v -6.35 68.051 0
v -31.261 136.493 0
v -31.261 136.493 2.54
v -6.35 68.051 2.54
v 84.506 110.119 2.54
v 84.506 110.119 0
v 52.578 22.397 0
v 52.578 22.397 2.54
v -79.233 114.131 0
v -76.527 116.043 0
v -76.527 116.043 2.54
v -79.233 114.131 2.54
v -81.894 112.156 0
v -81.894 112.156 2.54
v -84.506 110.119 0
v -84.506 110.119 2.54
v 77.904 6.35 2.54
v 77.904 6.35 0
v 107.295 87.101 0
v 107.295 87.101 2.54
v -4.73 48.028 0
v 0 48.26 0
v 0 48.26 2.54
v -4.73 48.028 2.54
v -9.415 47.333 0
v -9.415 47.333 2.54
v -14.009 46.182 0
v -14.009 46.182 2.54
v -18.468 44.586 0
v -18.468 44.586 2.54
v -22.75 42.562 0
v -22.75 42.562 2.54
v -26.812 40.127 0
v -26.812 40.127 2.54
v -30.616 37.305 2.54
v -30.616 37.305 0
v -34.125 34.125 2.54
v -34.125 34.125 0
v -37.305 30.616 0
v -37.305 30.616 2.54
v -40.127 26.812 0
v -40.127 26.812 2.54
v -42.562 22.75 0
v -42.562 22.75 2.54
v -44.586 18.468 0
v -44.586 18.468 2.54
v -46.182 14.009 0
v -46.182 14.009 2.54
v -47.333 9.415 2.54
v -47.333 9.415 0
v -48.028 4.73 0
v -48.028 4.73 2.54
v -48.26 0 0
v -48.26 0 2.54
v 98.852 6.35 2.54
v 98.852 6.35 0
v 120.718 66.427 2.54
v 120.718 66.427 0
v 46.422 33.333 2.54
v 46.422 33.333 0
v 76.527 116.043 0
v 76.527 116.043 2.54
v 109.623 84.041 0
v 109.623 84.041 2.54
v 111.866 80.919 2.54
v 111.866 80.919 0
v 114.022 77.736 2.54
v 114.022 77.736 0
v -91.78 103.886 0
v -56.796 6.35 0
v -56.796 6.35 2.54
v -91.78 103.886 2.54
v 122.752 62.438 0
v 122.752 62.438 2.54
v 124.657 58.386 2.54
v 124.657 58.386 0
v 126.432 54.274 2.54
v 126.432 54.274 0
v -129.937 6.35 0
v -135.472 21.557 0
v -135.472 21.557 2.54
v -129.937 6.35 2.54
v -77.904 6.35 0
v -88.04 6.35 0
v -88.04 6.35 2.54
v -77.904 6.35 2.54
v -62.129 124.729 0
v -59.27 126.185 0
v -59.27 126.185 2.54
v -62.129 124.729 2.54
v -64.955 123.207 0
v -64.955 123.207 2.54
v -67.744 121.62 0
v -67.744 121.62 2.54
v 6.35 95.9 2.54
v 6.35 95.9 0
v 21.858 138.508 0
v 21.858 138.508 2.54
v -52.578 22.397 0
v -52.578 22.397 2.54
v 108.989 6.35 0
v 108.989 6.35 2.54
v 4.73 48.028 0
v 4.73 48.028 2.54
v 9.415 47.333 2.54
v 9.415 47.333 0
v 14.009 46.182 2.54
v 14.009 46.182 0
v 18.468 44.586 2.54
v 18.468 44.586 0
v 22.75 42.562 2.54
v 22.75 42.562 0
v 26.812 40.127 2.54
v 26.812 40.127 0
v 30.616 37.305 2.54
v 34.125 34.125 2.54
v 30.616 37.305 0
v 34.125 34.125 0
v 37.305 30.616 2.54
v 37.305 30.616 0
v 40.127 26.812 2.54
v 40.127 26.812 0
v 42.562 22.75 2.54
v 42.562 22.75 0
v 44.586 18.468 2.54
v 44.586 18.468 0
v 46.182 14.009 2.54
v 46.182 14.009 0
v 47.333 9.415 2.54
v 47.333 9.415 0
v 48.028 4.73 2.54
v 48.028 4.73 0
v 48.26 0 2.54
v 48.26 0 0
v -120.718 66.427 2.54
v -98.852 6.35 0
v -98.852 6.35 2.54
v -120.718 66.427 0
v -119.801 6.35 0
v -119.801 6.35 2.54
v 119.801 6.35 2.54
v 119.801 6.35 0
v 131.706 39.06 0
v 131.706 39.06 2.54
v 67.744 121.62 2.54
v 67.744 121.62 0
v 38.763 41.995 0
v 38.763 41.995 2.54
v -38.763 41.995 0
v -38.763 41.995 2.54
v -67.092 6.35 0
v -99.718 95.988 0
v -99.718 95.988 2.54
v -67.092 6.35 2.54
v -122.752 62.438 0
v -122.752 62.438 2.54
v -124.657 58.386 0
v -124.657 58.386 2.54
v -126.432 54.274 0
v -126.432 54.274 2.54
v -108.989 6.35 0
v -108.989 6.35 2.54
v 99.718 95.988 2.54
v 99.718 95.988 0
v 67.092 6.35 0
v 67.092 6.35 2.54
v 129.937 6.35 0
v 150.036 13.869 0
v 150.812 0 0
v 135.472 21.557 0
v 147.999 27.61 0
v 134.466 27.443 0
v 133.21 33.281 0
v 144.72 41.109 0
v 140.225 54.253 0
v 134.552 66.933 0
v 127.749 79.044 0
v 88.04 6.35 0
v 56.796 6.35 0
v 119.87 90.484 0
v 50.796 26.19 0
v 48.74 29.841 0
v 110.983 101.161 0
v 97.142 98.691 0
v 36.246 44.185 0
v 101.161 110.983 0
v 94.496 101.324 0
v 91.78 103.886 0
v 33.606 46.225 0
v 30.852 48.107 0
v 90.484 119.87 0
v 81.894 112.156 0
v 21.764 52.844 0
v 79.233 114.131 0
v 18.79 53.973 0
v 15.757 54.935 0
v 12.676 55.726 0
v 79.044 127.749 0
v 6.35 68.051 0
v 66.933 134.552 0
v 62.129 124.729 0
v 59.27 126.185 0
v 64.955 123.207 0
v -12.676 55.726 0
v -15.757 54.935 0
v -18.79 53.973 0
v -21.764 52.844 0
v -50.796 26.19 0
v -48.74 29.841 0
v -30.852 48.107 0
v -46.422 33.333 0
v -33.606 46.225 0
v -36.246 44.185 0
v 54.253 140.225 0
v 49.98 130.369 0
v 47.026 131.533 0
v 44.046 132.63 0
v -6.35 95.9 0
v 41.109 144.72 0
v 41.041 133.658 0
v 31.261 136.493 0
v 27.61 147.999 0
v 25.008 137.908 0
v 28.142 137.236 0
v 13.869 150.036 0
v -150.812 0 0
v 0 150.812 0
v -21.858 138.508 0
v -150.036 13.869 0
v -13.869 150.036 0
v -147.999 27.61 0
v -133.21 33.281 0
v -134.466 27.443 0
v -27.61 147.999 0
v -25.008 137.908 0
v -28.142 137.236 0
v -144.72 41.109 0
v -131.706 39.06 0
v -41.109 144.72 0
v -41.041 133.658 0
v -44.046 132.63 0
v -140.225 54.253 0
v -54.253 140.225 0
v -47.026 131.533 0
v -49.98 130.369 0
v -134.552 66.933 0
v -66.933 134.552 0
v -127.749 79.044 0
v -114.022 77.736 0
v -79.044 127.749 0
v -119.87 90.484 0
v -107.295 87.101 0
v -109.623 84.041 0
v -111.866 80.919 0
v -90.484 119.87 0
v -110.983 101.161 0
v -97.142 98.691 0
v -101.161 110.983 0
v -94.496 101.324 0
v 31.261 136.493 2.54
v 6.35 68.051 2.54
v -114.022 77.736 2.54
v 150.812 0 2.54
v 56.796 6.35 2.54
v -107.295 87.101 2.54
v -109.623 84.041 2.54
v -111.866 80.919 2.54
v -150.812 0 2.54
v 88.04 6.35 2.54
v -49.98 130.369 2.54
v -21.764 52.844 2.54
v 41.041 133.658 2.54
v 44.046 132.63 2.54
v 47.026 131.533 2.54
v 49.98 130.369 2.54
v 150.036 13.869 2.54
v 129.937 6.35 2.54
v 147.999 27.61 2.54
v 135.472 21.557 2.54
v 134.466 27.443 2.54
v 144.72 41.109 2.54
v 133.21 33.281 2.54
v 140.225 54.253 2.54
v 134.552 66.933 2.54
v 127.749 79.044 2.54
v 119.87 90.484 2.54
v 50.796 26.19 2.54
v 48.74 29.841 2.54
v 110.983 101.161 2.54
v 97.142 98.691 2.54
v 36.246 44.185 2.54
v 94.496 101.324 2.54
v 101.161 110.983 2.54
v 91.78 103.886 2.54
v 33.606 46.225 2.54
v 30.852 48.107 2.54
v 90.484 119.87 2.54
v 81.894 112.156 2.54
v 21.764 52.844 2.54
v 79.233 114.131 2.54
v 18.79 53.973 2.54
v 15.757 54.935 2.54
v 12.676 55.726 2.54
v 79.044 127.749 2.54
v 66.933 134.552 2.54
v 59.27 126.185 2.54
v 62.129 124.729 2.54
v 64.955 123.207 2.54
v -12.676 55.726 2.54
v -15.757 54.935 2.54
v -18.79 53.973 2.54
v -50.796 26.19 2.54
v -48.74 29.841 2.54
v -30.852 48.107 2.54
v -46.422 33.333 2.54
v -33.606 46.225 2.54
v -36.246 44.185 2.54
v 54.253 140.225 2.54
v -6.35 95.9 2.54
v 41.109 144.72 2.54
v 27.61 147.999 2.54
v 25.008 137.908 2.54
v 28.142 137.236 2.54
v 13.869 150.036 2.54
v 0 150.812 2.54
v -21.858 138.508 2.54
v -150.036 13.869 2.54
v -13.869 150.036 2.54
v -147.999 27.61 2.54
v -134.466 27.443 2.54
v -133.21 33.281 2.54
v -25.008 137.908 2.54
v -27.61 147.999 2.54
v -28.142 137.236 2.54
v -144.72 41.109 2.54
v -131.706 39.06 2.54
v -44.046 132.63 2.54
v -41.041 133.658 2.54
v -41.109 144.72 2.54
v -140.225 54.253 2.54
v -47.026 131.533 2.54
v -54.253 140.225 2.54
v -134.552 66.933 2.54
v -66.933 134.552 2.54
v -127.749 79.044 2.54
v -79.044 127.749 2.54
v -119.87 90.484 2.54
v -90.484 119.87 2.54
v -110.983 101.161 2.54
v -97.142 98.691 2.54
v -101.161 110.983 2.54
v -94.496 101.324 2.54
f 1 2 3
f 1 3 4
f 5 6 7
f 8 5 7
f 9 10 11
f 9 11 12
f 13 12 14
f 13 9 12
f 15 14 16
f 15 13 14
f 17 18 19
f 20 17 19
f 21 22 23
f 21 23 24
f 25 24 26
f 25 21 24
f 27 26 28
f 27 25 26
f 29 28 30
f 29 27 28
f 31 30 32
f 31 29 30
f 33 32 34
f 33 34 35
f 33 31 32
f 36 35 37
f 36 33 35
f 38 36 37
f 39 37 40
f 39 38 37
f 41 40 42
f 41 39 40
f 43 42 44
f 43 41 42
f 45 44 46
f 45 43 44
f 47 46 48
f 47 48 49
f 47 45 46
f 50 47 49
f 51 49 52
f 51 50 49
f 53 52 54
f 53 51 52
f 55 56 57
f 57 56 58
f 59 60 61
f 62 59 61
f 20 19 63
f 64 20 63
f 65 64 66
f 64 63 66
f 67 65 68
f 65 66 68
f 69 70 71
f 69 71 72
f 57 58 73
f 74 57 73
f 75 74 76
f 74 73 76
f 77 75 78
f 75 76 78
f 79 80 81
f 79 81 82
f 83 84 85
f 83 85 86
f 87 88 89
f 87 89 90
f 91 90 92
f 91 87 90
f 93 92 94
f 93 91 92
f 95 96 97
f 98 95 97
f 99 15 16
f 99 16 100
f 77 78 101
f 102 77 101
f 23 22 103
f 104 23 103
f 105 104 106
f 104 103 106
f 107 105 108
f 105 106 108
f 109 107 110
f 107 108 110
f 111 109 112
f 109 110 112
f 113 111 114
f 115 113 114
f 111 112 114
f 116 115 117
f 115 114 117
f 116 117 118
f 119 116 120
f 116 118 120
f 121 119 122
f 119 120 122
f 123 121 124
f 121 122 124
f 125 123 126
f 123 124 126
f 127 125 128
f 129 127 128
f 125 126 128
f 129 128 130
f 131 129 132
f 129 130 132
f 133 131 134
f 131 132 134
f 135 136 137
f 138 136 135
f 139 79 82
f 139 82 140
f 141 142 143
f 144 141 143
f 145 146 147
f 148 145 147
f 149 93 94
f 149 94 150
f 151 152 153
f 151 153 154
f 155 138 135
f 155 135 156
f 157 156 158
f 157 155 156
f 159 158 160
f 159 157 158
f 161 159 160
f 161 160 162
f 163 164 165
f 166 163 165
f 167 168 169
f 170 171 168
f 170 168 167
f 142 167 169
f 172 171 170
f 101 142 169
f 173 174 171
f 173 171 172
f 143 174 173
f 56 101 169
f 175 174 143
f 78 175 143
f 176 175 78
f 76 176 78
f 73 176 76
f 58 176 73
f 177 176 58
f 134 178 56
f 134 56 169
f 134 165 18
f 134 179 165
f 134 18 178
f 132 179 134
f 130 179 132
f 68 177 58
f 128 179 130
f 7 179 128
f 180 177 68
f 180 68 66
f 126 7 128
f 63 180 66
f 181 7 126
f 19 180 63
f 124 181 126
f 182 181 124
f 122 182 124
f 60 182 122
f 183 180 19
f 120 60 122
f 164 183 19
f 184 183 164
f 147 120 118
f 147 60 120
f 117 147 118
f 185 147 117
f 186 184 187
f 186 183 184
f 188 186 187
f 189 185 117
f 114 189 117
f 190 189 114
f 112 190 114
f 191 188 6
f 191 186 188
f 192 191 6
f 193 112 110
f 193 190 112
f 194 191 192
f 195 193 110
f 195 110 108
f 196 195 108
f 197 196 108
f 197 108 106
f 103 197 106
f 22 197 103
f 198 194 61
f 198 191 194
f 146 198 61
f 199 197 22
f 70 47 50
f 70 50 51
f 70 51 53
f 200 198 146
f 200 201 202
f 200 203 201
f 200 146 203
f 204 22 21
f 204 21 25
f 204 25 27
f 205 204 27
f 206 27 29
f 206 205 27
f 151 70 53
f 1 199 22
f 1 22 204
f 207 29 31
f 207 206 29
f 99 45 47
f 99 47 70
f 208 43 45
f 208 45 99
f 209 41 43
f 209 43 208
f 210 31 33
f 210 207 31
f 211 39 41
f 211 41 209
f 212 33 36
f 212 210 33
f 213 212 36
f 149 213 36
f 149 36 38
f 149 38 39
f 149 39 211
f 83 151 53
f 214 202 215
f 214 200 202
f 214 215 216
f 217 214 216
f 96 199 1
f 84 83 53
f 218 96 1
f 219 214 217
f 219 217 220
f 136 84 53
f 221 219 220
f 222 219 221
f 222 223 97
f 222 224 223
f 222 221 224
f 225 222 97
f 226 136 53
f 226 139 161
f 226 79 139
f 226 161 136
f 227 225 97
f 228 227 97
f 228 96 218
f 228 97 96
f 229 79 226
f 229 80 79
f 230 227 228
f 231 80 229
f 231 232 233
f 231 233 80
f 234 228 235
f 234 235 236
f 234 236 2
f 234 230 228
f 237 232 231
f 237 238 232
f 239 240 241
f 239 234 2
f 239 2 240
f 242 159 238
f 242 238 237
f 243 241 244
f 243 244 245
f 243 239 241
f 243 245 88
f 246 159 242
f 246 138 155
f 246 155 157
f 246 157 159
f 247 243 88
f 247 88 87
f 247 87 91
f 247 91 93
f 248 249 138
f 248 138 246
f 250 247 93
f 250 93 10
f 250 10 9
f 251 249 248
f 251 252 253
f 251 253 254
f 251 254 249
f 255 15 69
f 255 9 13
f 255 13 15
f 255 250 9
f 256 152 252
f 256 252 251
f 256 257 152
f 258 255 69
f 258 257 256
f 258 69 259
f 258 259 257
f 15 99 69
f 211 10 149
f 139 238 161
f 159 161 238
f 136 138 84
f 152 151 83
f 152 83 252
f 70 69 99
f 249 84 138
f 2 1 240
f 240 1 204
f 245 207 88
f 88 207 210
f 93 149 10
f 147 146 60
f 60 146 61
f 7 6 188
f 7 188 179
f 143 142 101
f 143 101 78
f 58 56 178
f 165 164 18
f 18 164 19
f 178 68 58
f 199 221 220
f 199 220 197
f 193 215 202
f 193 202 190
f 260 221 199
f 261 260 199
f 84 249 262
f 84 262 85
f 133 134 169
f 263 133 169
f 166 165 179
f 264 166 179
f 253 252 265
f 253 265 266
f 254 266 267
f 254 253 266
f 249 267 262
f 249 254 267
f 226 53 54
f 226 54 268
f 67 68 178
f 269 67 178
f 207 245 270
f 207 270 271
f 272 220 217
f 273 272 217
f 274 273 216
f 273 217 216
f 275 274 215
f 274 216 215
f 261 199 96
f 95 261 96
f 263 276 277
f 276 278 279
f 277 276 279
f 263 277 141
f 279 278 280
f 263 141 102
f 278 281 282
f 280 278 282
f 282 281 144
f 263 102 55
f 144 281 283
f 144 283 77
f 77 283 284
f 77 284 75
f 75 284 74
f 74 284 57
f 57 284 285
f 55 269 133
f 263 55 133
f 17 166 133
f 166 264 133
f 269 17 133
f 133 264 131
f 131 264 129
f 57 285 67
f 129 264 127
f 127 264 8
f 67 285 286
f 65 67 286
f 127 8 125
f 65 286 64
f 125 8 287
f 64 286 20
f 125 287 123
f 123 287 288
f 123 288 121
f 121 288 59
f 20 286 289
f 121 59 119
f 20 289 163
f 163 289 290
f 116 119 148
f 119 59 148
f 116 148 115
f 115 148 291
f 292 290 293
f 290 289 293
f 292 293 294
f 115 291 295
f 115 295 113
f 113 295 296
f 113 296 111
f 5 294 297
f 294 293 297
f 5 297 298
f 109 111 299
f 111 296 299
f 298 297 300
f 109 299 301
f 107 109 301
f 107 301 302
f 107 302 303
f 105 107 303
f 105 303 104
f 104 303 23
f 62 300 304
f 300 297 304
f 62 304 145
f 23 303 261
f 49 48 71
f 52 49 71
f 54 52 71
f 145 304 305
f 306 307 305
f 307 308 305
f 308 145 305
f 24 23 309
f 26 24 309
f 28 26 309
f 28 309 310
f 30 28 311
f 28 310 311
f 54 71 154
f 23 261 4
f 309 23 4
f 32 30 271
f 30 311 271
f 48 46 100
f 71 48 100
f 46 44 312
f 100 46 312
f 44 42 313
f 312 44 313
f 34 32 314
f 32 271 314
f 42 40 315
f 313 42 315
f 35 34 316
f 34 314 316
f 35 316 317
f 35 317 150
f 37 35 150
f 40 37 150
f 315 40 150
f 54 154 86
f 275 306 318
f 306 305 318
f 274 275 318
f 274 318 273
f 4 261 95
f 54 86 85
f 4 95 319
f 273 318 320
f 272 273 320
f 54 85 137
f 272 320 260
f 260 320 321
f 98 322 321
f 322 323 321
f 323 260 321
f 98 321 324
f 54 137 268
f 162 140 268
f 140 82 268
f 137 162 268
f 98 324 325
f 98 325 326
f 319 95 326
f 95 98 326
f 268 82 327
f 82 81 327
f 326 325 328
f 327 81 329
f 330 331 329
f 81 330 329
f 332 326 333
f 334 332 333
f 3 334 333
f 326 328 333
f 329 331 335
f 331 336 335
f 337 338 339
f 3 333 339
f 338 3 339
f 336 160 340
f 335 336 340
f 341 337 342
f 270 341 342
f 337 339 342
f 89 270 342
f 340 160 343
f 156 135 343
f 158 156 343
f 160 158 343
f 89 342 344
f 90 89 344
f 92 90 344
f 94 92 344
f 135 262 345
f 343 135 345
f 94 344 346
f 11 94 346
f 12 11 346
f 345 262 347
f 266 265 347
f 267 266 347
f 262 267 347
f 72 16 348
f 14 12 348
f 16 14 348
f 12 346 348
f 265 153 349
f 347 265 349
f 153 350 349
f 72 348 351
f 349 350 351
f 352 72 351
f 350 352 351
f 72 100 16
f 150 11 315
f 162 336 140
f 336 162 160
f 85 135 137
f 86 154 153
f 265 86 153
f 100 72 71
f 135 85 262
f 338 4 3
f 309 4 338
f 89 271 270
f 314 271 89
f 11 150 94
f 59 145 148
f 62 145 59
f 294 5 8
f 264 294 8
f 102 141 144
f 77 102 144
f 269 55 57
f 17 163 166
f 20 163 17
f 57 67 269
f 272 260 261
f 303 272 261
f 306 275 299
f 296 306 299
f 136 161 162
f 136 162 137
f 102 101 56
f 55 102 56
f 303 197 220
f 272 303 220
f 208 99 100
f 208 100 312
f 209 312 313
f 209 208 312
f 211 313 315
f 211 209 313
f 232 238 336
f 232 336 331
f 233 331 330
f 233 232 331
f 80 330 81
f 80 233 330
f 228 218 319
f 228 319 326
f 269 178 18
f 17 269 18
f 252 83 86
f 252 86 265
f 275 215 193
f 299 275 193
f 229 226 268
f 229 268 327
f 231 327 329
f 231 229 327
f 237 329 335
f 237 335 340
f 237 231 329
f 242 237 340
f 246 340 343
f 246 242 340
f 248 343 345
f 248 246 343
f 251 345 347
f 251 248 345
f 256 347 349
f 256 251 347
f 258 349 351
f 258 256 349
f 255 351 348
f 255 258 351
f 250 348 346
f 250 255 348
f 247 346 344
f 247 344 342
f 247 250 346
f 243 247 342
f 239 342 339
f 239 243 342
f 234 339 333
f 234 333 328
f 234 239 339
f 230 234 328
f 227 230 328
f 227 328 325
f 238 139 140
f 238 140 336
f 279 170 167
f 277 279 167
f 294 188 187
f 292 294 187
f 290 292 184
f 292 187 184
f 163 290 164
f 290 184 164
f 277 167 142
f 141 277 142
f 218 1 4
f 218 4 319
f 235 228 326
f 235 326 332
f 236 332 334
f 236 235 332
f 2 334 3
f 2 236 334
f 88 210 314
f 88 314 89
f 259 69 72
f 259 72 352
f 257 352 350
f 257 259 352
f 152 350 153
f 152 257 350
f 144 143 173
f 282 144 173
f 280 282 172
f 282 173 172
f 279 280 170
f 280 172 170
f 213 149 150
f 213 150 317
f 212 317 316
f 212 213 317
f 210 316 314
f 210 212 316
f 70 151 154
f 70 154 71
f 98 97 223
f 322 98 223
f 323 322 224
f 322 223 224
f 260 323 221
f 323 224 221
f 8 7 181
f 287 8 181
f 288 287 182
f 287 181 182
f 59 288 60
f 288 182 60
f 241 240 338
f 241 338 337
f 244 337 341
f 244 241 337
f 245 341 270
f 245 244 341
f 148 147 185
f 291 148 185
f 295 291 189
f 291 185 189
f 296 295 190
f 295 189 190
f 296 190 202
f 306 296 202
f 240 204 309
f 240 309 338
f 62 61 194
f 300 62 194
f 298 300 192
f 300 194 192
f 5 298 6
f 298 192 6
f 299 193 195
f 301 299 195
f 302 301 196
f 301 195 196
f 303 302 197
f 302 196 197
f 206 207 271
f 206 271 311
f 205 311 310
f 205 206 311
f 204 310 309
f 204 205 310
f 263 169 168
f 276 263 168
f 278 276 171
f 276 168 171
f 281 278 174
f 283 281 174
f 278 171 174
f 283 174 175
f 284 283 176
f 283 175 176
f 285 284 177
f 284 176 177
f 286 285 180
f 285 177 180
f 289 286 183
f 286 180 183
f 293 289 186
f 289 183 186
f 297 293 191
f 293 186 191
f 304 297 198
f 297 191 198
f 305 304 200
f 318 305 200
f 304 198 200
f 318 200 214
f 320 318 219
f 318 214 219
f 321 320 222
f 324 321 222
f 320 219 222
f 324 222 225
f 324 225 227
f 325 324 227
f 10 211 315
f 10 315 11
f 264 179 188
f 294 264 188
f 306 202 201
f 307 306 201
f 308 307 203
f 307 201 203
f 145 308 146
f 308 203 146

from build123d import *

# Parameters (mm, degrees)
F1_DEPTH = 2.54


with BuildPart() as f1:
    # F0 (on Top) → F1 (new body)
    with BuildSketch(Plane.XY):
        with BuildLine():
            ThreePointArc((0, 48.26), (34.124973, 34.124973), (48.26, 0))
            Line((48.26, 0), (150.8125, 0))
            ThreePointArc((150.8125, 0), (106.183757, 106.183757), (0, 150.8125))
            Line((0, 150.8125), (0, 48.26))
        make_face()
        with BuildLine():
            Line((84.506493, 110.11853), (52.578475, 22.397019))
            ThreePointArc((52.578475, 22.397019), (49.801558, 28.034396), (46.422481, 33.332803))
            Line((46.422481, 33.332803), (76.52652, 116.04297))
            ThreePointArc((76.52652, 116.04297), (80.569209, 113.151738), (84.506493, 110.11853))
        make_face(mode=Mode.SUBTRACT)
        with BuildLine():
            Line((108.98855, 6.35), (98.852257, 6.35))
            Line((98.852257, 6.35), (120.71846, 66.4269))
            ThreePointArc((120.71846, 66.4269), (123.721116, 60.419279), (126.431564, 54.274287))
            Line((126.431564, 54.274287), (108.98855, 6.35))
        make_face(mode=Mode.SUBTRACT)
        with BuildLine():
            ThreePointArc((131.706002, 39.059832), (133.869559, 30.368774), (135.471763, 21.55694))
            Line((135.471763, 21.55694), (129.93689, 6.35))
            Line((129.93689, 6.35), (119.800596, 6.35))
            Line((119.800596, 6.35), (131.706002, 39.059832))
        make_face(mode=Mode.SUBTRACT)
        with BuildLine():
            Line((67.091871, 6.35), (56.796127, 6.35))
            Line((56.796127, 6.35), (91.779944, 103.885775))
            ThreePointArc((91.779944, 103.885775), (95.827883, 100.016544), (99.717507, 95.988197))
            Line((99.717507, 95.988197), (67.091871, 6.35))
        make_face(mode=Mode.SUBTRACT)
        with BuildLine():
            Line((88.040211, 6.35), (77.903917, 6.35))
            Line((77.903917, 6.35), (107.29494, 87.10117))
            ThreePointArc((107.29494, 87.10117), (110.755392, 82.487904), (114.022499, 77.735749))
            Line((114.022499, 77.735749), (88.040211, 6.35))
        make_face(mode=Mode.SUBTRACT)
        with BuildLine():
            ThreePointArc((21.763532, 52.843838), (17.280179, 54.474929), (12.676404, 55.726397))
            Line((12.676404, 55.726397), (41.041329, 133.658389))
            ThreePointArc((41.041329, 133.658389), (45.538899, 132.089902), (49.980383, 130.368999))
            Line((49.980383, 130.368999), (21.763532, 52.843838))
        make_face(mode=Mode.SUBTRACT)
        with BuildLine():
            Line((31.26083, 136.49254), (6.35, 68.050598))
            Line((6.35, 68.050598), (6.35, 95.899834))
            Line((6.35, 95.899834), (21.858168, 138.508175))
            ThreePointArc((21.858168, 138.508175), (26.576847, 137.581285), (31.26083, 136.49254))
        make_face(mode=Mode.SUBTRACT)
        with BuildLine():
            ThreePointArc((38.763073, 41.994603), (34.94125, 45.224236), (30.851582, 48.107197))
            Line((30.851582, 48.107197), (59.269677, 126.185272))
            ThreePointArc((59.269677, 126.185272), (63.546378, 123.975746), (67.744416, 121.620189))
            Line((67.744416, 121.620189), (38.763073, 41.994603))
        make_face(mode=Mode.SUBTRACT)
    extrude(amount=F1_DEPTH)

    # F2: F1 across plane


with BuildPart() as f1_1:
    add(f1.part)
    add(f1.part.mirror(Plane.YZ))


solid = f1_1.part
